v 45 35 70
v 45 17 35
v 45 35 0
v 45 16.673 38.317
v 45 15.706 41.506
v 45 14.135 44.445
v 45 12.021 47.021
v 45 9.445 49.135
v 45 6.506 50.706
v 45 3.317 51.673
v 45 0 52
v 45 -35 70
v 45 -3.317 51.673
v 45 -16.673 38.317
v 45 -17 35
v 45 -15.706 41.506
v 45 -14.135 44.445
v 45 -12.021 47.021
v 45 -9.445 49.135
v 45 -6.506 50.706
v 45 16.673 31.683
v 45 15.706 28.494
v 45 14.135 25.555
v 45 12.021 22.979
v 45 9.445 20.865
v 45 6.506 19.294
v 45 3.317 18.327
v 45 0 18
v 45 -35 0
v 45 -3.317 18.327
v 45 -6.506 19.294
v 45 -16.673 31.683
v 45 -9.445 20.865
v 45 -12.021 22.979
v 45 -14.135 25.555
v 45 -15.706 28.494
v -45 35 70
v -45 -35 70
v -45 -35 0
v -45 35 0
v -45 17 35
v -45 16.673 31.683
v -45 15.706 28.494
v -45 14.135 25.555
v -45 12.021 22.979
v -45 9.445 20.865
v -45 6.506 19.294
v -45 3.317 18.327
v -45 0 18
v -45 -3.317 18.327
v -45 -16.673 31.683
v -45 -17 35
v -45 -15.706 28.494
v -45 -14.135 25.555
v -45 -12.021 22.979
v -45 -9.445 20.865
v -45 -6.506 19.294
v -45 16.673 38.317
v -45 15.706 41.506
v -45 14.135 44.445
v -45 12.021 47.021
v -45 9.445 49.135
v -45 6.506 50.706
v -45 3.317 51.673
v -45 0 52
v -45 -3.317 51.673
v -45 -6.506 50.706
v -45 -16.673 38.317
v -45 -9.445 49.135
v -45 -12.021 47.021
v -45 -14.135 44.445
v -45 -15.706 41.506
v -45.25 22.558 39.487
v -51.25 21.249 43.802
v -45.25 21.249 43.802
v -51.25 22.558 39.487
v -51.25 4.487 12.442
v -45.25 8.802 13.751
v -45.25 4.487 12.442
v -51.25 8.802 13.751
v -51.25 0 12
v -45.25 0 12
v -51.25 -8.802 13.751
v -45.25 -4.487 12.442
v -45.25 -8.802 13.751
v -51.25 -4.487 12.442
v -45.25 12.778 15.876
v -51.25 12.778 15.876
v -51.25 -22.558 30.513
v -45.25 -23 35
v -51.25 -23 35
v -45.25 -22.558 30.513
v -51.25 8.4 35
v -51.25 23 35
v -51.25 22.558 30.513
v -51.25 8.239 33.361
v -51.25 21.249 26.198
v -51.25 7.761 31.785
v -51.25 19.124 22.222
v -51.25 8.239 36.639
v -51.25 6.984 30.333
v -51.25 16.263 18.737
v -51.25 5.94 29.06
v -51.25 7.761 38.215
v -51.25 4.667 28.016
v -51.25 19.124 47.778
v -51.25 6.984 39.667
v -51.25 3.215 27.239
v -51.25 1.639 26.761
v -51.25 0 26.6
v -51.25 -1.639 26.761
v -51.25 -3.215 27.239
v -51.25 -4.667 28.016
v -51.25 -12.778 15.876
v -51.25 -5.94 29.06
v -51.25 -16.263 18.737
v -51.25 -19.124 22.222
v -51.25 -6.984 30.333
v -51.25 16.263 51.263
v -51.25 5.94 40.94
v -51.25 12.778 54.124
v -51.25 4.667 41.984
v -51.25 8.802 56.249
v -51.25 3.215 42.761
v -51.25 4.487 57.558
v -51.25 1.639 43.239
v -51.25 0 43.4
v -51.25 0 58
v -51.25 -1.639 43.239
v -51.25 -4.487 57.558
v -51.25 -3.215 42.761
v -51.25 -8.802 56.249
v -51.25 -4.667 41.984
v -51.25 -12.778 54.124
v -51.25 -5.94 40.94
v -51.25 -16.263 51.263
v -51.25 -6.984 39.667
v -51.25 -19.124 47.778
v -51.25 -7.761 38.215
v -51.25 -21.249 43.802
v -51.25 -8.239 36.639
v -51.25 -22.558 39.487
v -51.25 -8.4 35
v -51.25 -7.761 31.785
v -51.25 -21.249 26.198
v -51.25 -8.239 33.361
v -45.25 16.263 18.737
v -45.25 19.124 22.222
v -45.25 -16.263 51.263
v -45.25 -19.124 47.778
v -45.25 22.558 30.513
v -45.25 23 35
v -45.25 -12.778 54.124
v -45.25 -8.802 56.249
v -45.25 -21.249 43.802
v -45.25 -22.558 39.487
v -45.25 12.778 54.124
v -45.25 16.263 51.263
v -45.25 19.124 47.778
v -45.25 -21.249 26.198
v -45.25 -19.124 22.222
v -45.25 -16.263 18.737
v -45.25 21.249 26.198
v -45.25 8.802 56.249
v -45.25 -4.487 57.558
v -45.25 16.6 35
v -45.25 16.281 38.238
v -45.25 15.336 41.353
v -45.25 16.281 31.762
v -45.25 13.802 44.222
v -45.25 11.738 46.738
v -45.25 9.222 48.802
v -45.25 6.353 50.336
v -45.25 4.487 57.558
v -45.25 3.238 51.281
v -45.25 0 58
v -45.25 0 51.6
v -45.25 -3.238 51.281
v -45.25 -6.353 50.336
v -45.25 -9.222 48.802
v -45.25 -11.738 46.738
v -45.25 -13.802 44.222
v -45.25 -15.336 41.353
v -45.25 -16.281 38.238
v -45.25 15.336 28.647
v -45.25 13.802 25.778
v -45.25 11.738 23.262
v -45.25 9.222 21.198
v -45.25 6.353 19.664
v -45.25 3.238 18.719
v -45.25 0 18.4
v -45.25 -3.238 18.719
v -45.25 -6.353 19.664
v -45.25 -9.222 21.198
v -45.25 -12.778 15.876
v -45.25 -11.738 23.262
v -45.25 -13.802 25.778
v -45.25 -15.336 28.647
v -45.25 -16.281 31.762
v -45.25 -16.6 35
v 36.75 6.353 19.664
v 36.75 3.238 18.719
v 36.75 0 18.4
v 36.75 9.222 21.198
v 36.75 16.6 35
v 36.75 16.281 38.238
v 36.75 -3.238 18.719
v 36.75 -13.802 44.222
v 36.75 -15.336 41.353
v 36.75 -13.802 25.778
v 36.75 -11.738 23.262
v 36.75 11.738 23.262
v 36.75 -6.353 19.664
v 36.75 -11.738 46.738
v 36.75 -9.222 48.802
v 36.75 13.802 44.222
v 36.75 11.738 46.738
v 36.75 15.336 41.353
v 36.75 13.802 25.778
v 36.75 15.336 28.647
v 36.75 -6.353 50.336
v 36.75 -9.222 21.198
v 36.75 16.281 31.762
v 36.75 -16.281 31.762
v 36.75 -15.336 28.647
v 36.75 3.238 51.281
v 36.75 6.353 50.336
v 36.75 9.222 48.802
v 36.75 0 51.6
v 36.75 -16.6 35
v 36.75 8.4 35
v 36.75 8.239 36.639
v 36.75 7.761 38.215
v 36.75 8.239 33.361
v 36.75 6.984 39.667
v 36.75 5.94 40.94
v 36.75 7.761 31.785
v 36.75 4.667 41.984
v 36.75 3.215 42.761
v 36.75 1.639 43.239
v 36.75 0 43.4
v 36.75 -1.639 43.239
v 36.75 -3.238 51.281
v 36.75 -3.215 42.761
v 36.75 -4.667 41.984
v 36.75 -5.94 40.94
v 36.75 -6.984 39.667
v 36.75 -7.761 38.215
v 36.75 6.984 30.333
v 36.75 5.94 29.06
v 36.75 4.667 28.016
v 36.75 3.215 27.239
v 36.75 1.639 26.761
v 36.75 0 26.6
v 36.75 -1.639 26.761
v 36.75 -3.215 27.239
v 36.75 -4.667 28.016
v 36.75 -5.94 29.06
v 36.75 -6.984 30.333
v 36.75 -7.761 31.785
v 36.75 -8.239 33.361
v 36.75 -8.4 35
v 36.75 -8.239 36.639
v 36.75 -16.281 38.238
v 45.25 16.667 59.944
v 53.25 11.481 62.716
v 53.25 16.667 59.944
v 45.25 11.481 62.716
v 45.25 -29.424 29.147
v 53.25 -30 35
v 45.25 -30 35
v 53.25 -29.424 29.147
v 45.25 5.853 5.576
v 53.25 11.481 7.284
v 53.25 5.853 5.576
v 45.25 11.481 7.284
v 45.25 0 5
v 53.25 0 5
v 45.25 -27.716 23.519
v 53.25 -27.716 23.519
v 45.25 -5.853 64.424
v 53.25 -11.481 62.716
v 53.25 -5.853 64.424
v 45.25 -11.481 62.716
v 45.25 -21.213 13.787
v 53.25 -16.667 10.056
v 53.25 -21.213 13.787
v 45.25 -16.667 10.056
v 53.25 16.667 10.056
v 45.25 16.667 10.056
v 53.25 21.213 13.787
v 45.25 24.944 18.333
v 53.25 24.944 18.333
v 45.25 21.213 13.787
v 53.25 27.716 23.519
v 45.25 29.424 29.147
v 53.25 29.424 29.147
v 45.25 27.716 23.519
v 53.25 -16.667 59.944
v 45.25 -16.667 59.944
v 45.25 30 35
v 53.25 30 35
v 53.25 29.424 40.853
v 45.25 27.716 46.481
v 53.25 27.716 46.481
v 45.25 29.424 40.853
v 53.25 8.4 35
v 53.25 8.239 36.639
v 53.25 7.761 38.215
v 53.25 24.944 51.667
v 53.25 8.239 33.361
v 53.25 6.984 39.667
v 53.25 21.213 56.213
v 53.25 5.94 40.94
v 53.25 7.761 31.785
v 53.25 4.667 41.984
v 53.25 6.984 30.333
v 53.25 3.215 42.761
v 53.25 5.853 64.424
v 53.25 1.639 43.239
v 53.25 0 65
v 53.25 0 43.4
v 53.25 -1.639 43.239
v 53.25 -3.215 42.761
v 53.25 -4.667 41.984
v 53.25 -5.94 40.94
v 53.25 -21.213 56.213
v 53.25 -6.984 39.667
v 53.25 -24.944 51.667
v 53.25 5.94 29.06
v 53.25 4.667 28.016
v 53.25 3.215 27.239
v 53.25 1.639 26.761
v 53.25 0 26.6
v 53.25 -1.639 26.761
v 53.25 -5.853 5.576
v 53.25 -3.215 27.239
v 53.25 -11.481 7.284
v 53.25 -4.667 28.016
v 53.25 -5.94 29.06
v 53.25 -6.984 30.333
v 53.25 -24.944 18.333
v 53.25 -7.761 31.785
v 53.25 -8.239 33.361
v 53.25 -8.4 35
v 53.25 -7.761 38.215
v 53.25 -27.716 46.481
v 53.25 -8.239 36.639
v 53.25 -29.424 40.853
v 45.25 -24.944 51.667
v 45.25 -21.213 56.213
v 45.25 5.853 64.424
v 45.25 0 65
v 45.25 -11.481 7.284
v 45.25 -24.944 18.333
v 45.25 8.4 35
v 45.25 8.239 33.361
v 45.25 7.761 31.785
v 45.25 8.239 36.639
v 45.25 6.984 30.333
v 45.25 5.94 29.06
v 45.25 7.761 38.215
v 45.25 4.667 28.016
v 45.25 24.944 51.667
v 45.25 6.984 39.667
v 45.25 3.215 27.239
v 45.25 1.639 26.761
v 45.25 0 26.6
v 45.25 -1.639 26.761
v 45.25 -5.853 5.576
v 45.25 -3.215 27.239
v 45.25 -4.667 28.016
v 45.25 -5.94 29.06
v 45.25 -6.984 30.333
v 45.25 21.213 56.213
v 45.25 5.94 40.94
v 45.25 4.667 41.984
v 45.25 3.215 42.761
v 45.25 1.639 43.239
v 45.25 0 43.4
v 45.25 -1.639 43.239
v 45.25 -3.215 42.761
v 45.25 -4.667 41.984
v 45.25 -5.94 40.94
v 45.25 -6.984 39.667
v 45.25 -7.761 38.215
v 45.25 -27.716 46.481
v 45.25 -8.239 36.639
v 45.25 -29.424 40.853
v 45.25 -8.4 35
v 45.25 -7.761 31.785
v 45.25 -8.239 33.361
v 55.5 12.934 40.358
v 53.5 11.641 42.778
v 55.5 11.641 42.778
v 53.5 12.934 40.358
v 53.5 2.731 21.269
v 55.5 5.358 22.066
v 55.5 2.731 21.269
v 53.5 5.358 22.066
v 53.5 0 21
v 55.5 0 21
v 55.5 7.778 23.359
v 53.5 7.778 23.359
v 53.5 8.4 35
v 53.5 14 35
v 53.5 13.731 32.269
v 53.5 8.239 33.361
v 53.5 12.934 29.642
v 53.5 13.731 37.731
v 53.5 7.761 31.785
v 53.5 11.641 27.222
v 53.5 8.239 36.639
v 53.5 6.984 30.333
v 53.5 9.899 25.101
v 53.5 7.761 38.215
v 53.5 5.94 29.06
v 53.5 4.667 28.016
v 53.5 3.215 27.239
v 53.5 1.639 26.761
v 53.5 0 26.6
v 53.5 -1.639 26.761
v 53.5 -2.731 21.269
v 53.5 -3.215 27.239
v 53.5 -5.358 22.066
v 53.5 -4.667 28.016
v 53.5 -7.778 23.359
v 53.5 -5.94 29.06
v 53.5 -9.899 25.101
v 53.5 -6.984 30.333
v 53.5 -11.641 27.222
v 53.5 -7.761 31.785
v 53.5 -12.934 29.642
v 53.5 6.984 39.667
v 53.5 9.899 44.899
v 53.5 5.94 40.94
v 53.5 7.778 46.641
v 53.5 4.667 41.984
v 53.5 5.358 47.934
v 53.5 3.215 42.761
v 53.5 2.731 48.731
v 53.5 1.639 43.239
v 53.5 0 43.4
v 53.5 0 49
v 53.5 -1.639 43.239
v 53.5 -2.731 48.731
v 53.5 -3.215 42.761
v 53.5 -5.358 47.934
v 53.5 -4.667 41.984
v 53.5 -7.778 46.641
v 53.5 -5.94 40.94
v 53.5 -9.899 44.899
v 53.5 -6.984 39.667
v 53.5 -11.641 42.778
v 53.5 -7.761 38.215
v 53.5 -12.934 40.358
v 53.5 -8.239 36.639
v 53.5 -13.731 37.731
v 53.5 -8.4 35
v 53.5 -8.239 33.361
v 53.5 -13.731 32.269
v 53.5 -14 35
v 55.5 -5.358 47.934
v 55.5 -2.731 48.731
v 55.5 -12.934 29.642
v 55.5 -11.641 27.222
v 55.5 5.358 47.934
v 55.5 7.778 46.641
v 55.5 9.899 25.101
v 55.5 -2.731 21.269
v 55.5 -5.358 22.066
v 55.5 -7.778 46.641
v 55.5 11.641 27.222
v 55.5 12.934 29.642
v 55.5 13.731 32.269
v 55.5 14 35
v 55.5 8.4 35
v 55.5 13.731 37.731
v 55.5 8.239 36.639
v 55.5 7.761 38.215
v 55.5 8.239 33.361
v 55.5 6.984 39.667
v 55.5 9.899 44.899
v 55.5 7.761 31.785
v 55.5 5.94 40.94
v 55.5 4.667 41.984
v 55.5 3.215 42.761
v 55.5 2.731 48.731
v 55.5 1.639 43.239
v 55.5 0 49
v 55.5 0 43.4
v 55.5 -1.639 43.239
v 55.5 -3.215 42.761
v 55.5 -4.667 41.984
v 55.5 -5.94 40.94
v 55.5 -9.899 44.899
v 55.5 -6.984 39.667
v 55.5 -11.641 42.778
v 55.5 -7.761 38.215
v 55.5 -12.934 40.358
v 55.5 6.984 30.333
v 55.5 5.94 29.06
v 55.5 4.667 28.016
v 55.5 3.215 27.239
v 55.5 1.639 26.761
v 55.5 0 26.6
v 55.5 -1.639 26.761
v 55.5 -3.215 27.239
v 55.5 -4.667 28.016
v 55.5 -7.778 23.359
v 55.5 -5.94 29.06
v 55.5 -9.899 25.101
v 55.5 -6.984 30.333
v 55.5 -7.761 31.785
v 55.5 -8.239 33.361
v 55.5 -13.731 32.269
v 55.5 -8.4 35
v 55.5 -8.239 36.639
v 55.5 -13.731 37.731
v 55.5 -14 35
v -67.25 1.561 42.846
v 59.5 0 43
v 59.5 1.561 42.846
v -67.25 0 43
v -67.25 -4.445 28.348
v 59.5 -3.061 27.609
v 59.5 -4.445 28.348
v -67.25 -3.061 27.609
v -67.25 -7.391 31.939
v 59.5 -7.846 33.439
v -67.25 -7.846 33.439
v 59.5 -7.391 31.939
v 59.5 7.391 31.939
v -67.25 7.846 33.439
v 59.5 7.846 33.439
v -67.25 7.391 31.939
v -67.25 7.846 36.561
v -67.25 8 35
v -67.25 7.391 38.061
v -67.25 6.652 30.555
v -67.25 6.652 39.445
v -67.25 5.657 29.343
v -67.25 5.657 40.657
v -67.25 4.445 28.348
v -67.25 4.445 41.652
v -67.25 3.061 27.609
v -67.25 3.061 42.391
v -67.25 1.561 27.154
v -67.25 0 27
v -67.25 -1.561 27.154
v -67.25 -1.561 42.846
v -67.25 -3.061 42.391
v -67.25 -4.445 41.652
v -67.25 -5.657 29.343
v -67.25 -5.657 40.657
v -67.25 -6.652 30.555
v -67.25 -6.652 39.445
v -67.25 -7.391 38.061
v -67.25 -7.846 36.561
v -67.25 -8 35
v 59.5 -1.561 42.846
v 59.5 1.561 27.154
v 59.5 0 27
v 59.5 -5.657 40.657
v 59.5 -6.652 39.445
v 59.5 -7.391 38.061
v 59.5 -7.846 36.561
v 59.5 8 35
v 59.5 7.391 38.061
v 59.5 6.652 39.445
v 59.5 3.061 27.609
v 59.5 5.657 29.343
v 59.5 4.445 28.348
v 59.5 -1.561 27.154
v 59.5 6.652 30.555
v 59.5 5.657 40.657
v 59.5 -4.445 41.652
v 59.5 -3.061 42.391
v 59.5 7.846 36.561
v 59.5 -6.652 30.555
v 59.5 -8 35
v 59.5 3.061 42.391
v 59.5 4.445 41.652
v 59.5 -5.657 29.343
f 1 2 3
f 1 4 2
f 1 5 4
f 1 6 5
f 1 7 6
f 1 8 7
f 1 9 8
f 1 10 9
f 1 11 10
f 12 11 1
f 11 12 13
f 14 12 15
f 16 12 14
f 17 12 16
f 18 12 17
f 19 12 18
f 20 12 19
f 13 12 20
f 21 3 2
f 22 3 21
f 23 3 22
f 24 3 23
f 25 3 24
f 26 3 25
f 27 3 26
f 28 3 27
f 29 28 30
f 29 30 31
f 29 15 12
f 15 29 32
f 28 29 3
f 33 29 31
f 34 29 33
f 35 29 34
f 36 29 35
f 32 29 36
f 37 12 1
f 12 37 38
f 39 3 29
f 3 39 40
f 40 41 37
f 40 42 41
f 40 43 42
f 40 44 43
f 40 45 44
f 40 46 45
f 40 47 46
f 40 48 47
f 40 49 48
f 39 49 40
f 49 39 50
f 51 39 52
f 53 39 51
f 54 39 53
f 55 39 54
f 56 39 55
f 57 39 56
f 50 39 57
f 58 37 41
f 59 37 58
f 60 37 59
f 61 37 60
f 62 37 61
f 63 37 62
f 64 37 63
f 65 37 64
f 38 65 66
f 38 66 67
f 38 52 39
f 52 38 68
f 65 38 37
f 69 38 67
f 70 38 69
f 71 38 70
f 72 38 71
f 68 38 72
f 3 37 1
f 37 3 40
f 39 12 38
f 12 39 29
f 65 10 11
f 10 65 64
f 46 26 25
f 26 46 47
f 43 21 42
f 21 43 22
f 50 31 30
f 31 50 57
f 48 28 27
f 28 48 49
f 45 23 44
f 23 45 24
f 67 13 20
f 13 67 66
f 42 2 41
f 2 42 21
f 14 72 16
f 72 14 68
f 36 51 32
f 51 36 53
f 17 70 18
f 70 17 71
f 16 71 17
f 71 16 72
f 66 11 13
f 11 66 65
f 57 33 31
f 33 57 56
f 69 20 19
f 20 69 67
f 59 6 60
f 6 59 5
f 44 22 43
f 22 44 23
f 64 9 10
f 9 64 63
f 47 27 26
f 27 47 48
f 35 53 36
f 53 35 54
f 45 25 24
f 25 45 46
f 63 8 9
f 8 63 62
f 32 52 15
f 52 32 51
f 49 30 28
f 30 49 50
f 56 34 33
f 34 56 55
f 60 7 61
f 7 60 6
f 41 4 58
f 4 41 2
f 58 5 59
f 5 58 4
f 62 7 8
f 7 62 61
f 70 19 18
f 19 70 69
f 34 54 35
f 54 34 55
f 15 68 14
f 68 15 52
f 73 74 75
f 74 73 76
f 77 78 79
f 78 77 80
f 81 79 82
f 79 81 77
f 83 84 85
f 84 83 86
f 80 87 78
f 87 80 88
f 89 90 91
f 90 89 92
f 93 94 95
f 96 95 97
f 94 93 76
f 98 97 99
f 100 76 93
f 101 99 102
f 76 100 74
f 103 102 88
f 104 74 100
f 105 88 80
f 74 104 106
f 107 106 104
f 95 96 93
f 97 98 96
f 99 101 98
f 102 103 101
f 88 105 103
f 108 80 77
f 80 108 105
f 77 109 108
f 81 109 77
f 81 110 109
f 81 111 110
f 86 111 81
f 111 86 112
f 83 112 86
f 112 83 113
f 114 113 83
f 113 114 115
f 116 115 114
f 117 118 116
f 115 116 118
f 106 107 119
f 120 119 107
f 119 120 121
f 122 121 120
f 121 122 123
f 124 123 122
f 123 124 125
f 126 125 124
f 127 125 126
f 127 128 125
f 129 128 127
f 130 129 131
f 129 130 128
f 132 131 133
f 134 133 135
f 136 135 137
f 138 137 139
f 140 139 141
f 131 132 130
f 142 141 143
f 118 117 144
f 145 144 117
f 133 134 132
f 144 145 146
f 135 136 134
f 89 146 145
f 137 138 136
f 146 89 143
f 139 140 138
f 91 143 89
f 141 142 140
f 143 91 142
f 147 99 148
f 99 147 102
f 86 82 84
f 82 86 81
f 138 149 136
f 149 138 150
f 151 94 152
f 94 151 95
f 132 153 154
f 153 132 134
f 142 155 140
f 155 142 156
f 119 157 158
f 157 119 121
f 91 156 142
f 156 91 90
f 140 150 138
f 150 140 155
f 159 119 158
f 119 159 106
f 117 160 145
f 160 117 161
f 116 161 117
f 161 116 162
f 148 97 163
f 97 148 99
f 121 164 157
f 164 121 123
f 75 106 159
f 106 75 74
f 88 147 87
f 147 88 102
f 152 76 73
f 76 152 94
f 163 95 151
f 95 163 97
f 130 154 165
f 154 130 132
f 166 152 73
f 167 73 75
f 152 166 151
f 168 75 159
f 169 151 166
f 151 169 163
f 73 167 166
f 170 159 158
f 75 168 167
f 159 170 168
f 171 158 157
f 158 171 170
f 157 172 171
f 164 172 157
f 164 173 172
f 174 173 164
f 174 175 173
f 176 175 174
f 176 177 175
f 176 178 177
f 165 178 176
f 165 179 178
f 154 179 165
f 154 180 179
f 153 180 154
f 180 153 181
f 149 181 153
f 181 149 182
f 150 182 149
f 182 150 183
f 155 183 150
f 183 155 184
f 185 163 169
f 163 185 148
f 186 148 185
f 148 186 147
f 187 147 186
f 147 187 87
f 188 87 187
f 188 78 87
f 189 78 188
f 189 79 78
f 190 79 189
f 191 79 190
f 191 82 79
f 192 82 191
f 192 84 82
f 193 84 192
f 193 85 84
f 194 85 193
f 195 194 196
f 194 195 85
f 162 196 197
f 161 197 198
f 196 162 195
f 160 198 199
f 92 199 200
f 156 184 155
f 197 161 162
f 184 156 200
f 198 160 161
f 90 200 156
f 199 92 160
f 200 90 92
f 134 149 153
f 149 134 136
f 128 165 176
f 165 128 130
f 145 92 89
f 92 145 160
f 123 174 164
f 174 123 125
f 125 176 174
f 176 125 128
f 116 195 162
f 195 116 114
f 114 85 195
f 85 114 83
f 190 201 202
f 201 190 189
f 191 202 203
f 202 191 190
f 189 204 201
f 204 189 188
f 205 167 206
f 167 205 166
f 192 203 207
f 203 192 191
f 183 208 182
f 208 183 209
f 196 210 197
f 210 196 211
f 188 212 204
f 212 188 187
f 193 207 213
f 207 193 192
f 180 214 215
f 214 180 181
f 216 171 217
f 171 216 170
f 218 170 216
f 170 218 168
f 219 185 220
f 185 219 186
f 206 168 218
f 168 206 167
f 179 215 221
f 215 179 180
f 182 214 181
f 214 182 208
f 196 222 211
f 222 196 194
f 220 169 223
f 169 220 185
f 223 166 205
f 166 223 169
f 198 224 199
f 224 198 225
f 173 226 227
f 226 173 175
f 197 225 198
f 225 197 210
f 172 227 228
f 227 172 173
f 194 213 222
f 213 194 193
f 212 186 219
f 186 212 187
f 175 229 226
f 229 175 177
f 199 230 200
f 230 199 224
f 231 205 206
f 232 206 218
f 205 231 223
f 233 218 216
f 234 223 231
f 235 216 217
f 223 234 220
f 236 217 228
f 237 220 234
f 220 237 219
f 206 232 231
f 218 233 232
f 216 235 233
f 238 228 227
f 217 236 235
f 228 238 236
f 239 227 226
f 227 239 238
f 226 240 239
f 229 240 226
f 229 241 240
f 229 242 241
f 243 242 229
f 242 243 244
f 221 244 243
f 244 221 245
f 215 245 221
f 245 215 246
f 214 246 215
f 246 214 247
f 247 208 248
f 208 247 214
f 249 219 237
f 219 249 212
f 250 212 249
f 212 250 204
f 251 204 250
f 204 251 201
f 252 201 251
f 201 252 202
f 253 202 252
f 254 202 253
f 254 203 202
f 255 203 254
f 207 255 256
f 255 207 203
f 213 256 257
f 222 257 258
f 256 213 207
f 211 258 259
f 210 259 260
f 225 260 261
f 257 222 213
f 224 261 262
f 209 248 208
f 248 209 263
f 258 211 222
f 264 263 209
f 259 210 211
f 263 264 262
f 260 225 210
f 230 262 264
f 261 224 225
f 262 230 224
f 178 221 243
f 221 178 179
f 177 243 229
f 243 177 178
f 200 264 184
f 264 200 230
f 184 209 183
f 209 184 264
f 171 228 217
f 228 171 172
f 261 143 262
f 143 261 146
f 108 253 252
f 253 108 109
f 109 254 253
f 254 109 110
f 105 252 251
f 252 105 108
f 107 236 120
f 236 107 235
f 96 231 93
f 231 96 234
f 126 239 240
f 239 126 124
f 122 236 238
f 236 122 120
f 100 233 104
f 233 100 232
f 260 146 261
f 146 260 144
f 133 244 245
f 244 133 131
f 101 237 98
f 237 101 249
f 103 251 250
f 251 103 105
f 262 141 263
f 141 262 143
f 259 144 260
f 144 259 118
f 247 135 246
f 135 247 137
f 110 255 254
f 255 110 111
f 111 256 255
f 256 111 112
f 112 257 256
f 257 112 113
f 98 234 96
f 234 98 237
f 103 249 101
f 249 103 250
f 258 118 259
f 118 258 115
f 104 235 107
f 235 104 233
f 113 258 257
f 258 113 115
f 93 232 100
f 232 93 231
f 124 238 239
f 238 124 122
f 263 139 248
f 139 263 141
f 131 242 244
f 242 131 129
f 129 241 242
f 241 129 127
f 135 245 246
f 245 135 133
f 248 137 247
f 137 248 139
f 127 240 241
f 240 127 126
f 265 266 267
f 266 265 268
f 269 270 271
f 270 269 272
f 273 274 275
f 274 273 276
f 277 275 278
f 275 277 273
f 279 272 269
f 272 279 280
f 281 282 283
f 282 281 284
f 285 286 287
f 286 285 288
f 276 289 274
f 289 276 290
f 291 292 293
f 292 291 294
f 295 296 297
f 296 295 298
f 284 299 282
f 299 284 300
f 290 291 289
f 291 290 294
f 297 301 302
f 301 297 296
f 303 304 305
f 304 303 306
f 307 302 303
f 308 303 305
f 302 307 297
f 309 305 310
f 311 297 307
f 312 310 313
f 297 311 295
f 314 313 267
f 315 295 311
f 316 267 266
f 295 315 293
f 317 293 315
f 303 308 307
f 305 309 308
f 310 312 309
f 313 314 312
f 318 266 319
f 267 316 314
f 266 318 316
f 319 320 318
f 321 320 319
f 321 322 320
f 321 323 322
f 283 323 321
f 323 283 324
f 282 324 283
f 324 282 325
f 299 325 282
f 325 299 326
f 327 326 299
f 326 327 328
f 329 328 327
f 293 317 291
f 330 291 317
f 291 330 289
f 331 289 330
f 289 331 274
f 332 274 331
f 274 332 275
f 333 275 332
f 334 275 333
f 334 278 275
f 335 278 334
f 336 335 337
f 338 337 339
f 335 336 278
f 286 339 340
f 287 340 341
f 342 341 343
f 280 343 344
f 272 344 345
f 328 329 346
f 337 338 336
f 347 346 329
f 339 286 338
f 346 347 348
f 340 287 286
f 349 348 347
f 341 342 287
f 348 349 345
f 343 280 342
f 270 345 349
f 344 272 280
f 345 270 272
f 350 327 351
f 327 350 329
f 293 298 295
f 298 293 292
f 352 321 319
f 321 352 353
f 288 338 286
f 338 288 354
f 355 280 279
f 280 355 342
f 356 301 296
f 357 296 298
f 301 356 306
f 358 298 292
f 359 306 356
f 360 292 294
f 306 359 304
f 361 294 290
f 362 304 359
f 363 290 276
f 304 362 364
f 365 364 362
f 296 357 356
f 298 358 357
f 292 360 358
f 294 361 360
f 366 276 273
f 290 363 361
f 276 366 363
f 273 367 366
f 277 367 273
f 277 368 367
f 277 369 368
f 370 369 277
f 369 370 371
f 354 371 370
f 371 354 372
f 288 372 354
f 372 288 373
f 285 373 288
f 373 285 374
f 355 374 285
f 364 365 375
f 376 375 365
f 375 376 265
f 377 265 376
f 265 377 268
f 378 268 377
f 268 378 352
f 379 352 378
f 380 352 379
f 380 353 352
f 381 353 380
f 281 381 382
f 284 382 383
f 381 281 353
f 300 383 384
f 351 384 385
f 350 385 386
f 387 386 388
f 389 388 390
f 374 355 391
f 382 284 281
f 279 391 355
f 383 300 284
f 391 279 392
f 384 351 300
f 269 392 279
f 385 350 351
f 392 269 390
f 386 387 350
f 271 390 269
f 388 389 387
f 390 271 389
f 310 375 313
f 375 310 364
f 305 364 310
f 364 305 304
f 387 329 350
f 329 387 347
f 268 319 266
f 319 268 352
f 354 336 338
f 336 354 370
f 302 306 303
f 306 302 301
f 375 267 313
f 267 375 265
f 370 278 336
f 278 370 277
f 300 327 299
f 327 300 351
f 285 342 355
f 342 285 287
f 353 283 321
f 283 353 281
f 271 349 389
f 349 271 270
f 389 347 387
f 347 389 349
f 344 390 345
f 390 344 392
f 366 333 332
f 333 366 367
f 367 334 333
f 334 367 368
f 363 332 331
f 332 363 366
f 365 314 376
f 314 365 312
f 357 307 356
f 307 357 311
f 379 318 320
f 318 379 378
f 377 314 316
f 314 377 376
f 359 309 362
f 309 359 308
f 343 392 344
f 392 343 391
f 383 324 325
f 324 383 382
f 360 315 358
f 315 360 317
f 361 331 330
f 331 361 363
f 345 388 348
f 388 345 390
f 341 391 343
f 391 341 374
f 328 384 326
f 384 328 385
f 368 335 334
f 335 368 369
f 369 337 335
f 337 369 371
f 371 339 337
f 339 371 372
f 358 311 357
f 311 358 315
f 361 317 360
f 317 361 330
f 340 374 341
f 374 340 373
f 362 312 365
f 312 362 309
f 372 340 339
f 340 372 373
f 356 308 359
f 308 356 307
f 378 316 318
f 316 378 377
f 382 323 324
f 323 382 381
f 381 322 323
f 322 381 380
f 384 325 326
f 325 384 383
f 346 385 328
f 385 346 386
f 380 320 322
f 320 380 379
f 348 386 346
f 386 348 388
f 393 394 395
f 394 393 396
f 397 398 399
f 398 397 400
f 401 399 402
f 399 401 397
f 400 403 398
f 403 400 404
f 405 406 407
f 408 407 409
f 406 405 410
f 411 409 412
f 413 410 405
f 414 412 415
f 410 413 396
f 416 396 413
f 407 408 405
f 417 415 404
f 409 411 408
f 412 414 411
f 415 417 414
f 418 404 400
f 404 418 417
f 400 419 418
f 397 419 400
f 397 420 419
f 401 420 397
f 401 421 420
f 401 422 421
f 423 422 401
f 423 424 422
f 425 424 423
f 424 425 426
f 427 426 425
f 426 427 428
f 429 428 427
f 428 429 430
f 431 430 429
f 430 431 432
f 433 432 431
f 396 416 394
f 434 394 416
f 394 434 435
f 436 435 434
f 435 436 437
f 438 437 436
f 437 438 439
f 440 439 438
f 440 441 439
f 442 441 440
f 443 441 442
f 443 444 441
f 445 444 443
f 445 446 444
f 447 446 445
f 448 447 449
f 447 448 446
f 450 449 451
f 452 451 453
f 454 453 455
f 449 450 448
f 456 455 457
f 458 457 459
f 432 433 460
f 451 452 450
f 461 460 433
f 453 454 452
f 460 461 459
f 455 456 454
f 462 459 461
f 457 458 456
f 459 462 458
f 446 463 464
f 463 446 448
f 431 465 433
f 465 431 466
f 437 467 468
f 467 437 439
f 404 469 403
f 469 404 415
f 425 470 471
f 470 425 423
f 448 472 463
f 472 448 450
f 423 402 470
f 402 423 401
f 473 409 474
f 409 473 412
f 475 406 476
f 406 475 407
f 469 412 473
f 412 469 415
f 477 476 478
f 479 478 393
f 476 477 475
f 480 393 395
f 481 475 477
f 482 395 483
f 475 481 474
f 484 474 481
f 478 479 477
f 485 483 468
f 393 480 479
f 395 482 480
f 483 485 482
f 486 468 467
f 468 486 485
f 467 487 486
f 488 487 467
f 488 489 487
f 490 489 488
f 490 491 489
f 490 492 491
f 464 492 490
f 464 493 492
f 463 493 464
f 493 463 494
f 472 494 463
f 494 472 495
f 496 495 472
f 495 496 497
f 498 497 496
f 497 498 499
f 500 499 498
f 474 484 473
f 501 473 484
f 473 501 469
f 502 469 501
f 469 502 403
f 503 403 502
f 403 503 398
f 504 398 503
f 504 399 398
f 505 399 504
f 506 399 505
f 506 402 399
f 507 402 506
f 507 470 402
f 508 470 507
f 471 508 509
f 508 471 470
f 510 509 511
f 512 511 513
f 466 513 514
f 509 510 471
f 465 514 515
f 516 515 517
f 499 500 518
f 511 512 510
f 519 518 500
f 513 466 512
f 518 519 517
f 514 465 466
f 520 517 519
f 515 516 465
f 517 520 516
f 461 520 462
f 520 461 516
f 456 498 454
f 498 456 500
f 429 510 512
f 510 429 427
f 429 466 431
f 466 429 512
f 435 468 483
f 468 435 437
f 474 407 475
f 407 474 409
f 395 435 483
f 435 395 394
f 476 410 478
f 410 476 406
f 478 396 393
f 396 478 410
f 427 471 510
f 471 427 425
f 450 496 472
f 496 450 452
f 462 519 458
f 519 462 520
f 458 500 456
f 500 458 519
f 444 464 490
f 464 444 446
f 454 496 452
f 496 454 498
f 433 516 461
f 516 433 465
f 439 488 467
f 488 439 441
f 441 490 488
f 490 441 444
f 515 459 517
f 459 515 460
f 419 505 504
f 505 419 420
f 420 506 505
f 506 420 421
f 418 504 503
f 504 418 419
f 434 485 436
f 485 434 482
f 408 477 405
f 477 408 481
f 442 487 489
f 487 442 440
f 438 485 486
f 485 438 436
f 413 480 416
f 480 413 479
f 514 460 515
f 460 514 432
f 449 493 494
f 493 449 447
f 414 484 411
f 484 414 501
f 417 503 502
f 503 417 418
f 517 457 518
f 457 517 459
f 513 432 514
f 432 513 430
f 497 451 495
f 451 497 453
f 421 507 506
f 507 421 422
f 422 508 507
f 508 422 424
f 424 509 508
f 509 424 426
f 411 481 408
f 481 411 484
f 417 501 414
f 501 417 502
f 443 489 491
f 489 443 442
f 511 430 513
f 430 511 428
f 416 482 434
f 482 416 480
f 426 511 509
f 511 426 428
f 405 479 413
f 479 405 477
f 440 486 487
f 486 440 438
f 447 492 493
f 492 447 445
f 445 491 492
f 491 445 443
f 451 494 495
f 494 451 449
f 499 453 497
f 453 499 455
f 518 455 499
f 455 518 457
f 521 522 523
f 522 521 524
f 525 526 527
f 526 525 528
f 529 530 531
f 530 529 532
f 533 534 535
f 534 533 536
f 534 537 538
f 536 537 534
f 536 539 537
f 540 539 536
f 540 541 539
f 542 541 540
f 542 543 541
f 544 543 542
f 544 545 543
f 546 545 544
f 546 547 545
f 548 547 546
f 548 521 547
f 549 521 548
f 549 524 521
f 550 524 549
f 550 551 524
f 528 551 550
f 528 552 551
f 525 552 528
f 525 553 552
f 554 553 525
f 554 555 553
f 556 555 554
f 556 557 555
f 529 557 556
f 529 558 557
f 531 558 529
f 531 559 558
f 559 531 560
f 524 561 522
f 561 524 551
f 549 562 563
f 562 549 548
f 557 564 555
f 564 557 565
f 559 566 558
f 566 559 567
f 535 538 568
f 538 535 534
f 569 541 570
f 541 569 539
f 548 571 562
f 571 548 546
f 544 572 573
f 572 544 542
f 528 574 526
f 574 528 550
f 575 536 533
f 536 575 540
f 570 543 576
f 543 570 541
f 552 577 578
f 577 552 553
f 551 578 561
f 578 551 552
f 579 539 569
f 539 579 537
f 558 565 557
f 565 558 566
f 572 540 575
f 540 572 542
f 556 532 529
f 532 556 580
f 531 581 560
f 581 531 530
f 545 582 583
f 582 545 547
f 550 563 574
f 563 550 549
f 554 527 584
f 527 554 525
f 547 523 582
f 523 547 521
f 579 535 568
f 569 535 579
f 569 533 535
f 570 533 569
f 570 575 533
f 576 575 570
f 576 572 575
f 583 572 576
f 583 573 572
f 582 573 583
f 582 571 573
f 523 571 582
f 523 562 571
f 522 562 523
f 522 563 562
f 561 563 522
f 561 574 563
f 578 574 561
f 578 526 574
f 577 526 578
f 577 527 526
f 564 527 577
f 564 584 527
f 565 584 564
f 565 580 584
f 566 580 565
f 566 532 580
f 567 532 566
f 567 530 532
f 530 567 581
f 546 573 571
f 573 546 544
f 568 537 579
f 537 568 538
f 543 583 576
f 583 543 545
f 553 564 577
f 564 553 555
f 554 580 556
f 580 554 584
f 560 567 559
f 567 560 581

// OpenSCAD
$fn = 32;

// ------------------------------------------------------------------------
// Bushed housing: 90 x 70 x 70 mm housing, bushing d33.2
// Every part is its own module, assembly() places them once.
// ------------------------------------------------------------------------

// --- part 1 ---
module housing() {
  difference() {
    translate([-45, -35, 0]) cube([90, 70, 70]);
    translate([0, 0, 35]) rotate([0, 90, 0]) cylinder(h = 92, d = 34, center = true);
  }
}

// --- part 2 ---
module bushing() {
  difference() {
    union() {
      cylinder(h = 6, d = 46);
      translate([0, 0, 6]) cylinder(h = 82, d = 33.2);
    }
    translate([0, 0, -1]) cylinder(h = 90, d = 16.8);
  }
}

// --- part 3 ---
module shaft() {
  translate([0, 0, -63.375]) cylinder(h = 126.75, d = 16);
}

// --- part 4 ---
module cover() {
  difference() {
    cylinder(h = 8, d = 60);
    translate([0, 0, -1]) cylinder(h = 10, d = 16.8);
  }
}

// --- part 5 ---
module washer() {
  difference() {
      translate([0, 0, 0]) cylinder(h = 2, d = 28);
      translate([0, 0, -1]) cylinder(h = 4, d = 16.8);
    }
}

// --- assembly ---
module assembly() {
  translate([0, 0, 0]) rotate([0, 0, 0]) housing();
  translate([-51.25, 0, 35]) rotate([0, 90, 0]) bushing();
  translate([-3.875, 0, 35]) rotate([0, 90, 0]) shaft();
  translate([45.25, 0, 35]) rotate([0, 90, 0]) cover();
  translate([53.5, 0, 35]) rotate([0, 90, 0]) washer();
}

assembly();
